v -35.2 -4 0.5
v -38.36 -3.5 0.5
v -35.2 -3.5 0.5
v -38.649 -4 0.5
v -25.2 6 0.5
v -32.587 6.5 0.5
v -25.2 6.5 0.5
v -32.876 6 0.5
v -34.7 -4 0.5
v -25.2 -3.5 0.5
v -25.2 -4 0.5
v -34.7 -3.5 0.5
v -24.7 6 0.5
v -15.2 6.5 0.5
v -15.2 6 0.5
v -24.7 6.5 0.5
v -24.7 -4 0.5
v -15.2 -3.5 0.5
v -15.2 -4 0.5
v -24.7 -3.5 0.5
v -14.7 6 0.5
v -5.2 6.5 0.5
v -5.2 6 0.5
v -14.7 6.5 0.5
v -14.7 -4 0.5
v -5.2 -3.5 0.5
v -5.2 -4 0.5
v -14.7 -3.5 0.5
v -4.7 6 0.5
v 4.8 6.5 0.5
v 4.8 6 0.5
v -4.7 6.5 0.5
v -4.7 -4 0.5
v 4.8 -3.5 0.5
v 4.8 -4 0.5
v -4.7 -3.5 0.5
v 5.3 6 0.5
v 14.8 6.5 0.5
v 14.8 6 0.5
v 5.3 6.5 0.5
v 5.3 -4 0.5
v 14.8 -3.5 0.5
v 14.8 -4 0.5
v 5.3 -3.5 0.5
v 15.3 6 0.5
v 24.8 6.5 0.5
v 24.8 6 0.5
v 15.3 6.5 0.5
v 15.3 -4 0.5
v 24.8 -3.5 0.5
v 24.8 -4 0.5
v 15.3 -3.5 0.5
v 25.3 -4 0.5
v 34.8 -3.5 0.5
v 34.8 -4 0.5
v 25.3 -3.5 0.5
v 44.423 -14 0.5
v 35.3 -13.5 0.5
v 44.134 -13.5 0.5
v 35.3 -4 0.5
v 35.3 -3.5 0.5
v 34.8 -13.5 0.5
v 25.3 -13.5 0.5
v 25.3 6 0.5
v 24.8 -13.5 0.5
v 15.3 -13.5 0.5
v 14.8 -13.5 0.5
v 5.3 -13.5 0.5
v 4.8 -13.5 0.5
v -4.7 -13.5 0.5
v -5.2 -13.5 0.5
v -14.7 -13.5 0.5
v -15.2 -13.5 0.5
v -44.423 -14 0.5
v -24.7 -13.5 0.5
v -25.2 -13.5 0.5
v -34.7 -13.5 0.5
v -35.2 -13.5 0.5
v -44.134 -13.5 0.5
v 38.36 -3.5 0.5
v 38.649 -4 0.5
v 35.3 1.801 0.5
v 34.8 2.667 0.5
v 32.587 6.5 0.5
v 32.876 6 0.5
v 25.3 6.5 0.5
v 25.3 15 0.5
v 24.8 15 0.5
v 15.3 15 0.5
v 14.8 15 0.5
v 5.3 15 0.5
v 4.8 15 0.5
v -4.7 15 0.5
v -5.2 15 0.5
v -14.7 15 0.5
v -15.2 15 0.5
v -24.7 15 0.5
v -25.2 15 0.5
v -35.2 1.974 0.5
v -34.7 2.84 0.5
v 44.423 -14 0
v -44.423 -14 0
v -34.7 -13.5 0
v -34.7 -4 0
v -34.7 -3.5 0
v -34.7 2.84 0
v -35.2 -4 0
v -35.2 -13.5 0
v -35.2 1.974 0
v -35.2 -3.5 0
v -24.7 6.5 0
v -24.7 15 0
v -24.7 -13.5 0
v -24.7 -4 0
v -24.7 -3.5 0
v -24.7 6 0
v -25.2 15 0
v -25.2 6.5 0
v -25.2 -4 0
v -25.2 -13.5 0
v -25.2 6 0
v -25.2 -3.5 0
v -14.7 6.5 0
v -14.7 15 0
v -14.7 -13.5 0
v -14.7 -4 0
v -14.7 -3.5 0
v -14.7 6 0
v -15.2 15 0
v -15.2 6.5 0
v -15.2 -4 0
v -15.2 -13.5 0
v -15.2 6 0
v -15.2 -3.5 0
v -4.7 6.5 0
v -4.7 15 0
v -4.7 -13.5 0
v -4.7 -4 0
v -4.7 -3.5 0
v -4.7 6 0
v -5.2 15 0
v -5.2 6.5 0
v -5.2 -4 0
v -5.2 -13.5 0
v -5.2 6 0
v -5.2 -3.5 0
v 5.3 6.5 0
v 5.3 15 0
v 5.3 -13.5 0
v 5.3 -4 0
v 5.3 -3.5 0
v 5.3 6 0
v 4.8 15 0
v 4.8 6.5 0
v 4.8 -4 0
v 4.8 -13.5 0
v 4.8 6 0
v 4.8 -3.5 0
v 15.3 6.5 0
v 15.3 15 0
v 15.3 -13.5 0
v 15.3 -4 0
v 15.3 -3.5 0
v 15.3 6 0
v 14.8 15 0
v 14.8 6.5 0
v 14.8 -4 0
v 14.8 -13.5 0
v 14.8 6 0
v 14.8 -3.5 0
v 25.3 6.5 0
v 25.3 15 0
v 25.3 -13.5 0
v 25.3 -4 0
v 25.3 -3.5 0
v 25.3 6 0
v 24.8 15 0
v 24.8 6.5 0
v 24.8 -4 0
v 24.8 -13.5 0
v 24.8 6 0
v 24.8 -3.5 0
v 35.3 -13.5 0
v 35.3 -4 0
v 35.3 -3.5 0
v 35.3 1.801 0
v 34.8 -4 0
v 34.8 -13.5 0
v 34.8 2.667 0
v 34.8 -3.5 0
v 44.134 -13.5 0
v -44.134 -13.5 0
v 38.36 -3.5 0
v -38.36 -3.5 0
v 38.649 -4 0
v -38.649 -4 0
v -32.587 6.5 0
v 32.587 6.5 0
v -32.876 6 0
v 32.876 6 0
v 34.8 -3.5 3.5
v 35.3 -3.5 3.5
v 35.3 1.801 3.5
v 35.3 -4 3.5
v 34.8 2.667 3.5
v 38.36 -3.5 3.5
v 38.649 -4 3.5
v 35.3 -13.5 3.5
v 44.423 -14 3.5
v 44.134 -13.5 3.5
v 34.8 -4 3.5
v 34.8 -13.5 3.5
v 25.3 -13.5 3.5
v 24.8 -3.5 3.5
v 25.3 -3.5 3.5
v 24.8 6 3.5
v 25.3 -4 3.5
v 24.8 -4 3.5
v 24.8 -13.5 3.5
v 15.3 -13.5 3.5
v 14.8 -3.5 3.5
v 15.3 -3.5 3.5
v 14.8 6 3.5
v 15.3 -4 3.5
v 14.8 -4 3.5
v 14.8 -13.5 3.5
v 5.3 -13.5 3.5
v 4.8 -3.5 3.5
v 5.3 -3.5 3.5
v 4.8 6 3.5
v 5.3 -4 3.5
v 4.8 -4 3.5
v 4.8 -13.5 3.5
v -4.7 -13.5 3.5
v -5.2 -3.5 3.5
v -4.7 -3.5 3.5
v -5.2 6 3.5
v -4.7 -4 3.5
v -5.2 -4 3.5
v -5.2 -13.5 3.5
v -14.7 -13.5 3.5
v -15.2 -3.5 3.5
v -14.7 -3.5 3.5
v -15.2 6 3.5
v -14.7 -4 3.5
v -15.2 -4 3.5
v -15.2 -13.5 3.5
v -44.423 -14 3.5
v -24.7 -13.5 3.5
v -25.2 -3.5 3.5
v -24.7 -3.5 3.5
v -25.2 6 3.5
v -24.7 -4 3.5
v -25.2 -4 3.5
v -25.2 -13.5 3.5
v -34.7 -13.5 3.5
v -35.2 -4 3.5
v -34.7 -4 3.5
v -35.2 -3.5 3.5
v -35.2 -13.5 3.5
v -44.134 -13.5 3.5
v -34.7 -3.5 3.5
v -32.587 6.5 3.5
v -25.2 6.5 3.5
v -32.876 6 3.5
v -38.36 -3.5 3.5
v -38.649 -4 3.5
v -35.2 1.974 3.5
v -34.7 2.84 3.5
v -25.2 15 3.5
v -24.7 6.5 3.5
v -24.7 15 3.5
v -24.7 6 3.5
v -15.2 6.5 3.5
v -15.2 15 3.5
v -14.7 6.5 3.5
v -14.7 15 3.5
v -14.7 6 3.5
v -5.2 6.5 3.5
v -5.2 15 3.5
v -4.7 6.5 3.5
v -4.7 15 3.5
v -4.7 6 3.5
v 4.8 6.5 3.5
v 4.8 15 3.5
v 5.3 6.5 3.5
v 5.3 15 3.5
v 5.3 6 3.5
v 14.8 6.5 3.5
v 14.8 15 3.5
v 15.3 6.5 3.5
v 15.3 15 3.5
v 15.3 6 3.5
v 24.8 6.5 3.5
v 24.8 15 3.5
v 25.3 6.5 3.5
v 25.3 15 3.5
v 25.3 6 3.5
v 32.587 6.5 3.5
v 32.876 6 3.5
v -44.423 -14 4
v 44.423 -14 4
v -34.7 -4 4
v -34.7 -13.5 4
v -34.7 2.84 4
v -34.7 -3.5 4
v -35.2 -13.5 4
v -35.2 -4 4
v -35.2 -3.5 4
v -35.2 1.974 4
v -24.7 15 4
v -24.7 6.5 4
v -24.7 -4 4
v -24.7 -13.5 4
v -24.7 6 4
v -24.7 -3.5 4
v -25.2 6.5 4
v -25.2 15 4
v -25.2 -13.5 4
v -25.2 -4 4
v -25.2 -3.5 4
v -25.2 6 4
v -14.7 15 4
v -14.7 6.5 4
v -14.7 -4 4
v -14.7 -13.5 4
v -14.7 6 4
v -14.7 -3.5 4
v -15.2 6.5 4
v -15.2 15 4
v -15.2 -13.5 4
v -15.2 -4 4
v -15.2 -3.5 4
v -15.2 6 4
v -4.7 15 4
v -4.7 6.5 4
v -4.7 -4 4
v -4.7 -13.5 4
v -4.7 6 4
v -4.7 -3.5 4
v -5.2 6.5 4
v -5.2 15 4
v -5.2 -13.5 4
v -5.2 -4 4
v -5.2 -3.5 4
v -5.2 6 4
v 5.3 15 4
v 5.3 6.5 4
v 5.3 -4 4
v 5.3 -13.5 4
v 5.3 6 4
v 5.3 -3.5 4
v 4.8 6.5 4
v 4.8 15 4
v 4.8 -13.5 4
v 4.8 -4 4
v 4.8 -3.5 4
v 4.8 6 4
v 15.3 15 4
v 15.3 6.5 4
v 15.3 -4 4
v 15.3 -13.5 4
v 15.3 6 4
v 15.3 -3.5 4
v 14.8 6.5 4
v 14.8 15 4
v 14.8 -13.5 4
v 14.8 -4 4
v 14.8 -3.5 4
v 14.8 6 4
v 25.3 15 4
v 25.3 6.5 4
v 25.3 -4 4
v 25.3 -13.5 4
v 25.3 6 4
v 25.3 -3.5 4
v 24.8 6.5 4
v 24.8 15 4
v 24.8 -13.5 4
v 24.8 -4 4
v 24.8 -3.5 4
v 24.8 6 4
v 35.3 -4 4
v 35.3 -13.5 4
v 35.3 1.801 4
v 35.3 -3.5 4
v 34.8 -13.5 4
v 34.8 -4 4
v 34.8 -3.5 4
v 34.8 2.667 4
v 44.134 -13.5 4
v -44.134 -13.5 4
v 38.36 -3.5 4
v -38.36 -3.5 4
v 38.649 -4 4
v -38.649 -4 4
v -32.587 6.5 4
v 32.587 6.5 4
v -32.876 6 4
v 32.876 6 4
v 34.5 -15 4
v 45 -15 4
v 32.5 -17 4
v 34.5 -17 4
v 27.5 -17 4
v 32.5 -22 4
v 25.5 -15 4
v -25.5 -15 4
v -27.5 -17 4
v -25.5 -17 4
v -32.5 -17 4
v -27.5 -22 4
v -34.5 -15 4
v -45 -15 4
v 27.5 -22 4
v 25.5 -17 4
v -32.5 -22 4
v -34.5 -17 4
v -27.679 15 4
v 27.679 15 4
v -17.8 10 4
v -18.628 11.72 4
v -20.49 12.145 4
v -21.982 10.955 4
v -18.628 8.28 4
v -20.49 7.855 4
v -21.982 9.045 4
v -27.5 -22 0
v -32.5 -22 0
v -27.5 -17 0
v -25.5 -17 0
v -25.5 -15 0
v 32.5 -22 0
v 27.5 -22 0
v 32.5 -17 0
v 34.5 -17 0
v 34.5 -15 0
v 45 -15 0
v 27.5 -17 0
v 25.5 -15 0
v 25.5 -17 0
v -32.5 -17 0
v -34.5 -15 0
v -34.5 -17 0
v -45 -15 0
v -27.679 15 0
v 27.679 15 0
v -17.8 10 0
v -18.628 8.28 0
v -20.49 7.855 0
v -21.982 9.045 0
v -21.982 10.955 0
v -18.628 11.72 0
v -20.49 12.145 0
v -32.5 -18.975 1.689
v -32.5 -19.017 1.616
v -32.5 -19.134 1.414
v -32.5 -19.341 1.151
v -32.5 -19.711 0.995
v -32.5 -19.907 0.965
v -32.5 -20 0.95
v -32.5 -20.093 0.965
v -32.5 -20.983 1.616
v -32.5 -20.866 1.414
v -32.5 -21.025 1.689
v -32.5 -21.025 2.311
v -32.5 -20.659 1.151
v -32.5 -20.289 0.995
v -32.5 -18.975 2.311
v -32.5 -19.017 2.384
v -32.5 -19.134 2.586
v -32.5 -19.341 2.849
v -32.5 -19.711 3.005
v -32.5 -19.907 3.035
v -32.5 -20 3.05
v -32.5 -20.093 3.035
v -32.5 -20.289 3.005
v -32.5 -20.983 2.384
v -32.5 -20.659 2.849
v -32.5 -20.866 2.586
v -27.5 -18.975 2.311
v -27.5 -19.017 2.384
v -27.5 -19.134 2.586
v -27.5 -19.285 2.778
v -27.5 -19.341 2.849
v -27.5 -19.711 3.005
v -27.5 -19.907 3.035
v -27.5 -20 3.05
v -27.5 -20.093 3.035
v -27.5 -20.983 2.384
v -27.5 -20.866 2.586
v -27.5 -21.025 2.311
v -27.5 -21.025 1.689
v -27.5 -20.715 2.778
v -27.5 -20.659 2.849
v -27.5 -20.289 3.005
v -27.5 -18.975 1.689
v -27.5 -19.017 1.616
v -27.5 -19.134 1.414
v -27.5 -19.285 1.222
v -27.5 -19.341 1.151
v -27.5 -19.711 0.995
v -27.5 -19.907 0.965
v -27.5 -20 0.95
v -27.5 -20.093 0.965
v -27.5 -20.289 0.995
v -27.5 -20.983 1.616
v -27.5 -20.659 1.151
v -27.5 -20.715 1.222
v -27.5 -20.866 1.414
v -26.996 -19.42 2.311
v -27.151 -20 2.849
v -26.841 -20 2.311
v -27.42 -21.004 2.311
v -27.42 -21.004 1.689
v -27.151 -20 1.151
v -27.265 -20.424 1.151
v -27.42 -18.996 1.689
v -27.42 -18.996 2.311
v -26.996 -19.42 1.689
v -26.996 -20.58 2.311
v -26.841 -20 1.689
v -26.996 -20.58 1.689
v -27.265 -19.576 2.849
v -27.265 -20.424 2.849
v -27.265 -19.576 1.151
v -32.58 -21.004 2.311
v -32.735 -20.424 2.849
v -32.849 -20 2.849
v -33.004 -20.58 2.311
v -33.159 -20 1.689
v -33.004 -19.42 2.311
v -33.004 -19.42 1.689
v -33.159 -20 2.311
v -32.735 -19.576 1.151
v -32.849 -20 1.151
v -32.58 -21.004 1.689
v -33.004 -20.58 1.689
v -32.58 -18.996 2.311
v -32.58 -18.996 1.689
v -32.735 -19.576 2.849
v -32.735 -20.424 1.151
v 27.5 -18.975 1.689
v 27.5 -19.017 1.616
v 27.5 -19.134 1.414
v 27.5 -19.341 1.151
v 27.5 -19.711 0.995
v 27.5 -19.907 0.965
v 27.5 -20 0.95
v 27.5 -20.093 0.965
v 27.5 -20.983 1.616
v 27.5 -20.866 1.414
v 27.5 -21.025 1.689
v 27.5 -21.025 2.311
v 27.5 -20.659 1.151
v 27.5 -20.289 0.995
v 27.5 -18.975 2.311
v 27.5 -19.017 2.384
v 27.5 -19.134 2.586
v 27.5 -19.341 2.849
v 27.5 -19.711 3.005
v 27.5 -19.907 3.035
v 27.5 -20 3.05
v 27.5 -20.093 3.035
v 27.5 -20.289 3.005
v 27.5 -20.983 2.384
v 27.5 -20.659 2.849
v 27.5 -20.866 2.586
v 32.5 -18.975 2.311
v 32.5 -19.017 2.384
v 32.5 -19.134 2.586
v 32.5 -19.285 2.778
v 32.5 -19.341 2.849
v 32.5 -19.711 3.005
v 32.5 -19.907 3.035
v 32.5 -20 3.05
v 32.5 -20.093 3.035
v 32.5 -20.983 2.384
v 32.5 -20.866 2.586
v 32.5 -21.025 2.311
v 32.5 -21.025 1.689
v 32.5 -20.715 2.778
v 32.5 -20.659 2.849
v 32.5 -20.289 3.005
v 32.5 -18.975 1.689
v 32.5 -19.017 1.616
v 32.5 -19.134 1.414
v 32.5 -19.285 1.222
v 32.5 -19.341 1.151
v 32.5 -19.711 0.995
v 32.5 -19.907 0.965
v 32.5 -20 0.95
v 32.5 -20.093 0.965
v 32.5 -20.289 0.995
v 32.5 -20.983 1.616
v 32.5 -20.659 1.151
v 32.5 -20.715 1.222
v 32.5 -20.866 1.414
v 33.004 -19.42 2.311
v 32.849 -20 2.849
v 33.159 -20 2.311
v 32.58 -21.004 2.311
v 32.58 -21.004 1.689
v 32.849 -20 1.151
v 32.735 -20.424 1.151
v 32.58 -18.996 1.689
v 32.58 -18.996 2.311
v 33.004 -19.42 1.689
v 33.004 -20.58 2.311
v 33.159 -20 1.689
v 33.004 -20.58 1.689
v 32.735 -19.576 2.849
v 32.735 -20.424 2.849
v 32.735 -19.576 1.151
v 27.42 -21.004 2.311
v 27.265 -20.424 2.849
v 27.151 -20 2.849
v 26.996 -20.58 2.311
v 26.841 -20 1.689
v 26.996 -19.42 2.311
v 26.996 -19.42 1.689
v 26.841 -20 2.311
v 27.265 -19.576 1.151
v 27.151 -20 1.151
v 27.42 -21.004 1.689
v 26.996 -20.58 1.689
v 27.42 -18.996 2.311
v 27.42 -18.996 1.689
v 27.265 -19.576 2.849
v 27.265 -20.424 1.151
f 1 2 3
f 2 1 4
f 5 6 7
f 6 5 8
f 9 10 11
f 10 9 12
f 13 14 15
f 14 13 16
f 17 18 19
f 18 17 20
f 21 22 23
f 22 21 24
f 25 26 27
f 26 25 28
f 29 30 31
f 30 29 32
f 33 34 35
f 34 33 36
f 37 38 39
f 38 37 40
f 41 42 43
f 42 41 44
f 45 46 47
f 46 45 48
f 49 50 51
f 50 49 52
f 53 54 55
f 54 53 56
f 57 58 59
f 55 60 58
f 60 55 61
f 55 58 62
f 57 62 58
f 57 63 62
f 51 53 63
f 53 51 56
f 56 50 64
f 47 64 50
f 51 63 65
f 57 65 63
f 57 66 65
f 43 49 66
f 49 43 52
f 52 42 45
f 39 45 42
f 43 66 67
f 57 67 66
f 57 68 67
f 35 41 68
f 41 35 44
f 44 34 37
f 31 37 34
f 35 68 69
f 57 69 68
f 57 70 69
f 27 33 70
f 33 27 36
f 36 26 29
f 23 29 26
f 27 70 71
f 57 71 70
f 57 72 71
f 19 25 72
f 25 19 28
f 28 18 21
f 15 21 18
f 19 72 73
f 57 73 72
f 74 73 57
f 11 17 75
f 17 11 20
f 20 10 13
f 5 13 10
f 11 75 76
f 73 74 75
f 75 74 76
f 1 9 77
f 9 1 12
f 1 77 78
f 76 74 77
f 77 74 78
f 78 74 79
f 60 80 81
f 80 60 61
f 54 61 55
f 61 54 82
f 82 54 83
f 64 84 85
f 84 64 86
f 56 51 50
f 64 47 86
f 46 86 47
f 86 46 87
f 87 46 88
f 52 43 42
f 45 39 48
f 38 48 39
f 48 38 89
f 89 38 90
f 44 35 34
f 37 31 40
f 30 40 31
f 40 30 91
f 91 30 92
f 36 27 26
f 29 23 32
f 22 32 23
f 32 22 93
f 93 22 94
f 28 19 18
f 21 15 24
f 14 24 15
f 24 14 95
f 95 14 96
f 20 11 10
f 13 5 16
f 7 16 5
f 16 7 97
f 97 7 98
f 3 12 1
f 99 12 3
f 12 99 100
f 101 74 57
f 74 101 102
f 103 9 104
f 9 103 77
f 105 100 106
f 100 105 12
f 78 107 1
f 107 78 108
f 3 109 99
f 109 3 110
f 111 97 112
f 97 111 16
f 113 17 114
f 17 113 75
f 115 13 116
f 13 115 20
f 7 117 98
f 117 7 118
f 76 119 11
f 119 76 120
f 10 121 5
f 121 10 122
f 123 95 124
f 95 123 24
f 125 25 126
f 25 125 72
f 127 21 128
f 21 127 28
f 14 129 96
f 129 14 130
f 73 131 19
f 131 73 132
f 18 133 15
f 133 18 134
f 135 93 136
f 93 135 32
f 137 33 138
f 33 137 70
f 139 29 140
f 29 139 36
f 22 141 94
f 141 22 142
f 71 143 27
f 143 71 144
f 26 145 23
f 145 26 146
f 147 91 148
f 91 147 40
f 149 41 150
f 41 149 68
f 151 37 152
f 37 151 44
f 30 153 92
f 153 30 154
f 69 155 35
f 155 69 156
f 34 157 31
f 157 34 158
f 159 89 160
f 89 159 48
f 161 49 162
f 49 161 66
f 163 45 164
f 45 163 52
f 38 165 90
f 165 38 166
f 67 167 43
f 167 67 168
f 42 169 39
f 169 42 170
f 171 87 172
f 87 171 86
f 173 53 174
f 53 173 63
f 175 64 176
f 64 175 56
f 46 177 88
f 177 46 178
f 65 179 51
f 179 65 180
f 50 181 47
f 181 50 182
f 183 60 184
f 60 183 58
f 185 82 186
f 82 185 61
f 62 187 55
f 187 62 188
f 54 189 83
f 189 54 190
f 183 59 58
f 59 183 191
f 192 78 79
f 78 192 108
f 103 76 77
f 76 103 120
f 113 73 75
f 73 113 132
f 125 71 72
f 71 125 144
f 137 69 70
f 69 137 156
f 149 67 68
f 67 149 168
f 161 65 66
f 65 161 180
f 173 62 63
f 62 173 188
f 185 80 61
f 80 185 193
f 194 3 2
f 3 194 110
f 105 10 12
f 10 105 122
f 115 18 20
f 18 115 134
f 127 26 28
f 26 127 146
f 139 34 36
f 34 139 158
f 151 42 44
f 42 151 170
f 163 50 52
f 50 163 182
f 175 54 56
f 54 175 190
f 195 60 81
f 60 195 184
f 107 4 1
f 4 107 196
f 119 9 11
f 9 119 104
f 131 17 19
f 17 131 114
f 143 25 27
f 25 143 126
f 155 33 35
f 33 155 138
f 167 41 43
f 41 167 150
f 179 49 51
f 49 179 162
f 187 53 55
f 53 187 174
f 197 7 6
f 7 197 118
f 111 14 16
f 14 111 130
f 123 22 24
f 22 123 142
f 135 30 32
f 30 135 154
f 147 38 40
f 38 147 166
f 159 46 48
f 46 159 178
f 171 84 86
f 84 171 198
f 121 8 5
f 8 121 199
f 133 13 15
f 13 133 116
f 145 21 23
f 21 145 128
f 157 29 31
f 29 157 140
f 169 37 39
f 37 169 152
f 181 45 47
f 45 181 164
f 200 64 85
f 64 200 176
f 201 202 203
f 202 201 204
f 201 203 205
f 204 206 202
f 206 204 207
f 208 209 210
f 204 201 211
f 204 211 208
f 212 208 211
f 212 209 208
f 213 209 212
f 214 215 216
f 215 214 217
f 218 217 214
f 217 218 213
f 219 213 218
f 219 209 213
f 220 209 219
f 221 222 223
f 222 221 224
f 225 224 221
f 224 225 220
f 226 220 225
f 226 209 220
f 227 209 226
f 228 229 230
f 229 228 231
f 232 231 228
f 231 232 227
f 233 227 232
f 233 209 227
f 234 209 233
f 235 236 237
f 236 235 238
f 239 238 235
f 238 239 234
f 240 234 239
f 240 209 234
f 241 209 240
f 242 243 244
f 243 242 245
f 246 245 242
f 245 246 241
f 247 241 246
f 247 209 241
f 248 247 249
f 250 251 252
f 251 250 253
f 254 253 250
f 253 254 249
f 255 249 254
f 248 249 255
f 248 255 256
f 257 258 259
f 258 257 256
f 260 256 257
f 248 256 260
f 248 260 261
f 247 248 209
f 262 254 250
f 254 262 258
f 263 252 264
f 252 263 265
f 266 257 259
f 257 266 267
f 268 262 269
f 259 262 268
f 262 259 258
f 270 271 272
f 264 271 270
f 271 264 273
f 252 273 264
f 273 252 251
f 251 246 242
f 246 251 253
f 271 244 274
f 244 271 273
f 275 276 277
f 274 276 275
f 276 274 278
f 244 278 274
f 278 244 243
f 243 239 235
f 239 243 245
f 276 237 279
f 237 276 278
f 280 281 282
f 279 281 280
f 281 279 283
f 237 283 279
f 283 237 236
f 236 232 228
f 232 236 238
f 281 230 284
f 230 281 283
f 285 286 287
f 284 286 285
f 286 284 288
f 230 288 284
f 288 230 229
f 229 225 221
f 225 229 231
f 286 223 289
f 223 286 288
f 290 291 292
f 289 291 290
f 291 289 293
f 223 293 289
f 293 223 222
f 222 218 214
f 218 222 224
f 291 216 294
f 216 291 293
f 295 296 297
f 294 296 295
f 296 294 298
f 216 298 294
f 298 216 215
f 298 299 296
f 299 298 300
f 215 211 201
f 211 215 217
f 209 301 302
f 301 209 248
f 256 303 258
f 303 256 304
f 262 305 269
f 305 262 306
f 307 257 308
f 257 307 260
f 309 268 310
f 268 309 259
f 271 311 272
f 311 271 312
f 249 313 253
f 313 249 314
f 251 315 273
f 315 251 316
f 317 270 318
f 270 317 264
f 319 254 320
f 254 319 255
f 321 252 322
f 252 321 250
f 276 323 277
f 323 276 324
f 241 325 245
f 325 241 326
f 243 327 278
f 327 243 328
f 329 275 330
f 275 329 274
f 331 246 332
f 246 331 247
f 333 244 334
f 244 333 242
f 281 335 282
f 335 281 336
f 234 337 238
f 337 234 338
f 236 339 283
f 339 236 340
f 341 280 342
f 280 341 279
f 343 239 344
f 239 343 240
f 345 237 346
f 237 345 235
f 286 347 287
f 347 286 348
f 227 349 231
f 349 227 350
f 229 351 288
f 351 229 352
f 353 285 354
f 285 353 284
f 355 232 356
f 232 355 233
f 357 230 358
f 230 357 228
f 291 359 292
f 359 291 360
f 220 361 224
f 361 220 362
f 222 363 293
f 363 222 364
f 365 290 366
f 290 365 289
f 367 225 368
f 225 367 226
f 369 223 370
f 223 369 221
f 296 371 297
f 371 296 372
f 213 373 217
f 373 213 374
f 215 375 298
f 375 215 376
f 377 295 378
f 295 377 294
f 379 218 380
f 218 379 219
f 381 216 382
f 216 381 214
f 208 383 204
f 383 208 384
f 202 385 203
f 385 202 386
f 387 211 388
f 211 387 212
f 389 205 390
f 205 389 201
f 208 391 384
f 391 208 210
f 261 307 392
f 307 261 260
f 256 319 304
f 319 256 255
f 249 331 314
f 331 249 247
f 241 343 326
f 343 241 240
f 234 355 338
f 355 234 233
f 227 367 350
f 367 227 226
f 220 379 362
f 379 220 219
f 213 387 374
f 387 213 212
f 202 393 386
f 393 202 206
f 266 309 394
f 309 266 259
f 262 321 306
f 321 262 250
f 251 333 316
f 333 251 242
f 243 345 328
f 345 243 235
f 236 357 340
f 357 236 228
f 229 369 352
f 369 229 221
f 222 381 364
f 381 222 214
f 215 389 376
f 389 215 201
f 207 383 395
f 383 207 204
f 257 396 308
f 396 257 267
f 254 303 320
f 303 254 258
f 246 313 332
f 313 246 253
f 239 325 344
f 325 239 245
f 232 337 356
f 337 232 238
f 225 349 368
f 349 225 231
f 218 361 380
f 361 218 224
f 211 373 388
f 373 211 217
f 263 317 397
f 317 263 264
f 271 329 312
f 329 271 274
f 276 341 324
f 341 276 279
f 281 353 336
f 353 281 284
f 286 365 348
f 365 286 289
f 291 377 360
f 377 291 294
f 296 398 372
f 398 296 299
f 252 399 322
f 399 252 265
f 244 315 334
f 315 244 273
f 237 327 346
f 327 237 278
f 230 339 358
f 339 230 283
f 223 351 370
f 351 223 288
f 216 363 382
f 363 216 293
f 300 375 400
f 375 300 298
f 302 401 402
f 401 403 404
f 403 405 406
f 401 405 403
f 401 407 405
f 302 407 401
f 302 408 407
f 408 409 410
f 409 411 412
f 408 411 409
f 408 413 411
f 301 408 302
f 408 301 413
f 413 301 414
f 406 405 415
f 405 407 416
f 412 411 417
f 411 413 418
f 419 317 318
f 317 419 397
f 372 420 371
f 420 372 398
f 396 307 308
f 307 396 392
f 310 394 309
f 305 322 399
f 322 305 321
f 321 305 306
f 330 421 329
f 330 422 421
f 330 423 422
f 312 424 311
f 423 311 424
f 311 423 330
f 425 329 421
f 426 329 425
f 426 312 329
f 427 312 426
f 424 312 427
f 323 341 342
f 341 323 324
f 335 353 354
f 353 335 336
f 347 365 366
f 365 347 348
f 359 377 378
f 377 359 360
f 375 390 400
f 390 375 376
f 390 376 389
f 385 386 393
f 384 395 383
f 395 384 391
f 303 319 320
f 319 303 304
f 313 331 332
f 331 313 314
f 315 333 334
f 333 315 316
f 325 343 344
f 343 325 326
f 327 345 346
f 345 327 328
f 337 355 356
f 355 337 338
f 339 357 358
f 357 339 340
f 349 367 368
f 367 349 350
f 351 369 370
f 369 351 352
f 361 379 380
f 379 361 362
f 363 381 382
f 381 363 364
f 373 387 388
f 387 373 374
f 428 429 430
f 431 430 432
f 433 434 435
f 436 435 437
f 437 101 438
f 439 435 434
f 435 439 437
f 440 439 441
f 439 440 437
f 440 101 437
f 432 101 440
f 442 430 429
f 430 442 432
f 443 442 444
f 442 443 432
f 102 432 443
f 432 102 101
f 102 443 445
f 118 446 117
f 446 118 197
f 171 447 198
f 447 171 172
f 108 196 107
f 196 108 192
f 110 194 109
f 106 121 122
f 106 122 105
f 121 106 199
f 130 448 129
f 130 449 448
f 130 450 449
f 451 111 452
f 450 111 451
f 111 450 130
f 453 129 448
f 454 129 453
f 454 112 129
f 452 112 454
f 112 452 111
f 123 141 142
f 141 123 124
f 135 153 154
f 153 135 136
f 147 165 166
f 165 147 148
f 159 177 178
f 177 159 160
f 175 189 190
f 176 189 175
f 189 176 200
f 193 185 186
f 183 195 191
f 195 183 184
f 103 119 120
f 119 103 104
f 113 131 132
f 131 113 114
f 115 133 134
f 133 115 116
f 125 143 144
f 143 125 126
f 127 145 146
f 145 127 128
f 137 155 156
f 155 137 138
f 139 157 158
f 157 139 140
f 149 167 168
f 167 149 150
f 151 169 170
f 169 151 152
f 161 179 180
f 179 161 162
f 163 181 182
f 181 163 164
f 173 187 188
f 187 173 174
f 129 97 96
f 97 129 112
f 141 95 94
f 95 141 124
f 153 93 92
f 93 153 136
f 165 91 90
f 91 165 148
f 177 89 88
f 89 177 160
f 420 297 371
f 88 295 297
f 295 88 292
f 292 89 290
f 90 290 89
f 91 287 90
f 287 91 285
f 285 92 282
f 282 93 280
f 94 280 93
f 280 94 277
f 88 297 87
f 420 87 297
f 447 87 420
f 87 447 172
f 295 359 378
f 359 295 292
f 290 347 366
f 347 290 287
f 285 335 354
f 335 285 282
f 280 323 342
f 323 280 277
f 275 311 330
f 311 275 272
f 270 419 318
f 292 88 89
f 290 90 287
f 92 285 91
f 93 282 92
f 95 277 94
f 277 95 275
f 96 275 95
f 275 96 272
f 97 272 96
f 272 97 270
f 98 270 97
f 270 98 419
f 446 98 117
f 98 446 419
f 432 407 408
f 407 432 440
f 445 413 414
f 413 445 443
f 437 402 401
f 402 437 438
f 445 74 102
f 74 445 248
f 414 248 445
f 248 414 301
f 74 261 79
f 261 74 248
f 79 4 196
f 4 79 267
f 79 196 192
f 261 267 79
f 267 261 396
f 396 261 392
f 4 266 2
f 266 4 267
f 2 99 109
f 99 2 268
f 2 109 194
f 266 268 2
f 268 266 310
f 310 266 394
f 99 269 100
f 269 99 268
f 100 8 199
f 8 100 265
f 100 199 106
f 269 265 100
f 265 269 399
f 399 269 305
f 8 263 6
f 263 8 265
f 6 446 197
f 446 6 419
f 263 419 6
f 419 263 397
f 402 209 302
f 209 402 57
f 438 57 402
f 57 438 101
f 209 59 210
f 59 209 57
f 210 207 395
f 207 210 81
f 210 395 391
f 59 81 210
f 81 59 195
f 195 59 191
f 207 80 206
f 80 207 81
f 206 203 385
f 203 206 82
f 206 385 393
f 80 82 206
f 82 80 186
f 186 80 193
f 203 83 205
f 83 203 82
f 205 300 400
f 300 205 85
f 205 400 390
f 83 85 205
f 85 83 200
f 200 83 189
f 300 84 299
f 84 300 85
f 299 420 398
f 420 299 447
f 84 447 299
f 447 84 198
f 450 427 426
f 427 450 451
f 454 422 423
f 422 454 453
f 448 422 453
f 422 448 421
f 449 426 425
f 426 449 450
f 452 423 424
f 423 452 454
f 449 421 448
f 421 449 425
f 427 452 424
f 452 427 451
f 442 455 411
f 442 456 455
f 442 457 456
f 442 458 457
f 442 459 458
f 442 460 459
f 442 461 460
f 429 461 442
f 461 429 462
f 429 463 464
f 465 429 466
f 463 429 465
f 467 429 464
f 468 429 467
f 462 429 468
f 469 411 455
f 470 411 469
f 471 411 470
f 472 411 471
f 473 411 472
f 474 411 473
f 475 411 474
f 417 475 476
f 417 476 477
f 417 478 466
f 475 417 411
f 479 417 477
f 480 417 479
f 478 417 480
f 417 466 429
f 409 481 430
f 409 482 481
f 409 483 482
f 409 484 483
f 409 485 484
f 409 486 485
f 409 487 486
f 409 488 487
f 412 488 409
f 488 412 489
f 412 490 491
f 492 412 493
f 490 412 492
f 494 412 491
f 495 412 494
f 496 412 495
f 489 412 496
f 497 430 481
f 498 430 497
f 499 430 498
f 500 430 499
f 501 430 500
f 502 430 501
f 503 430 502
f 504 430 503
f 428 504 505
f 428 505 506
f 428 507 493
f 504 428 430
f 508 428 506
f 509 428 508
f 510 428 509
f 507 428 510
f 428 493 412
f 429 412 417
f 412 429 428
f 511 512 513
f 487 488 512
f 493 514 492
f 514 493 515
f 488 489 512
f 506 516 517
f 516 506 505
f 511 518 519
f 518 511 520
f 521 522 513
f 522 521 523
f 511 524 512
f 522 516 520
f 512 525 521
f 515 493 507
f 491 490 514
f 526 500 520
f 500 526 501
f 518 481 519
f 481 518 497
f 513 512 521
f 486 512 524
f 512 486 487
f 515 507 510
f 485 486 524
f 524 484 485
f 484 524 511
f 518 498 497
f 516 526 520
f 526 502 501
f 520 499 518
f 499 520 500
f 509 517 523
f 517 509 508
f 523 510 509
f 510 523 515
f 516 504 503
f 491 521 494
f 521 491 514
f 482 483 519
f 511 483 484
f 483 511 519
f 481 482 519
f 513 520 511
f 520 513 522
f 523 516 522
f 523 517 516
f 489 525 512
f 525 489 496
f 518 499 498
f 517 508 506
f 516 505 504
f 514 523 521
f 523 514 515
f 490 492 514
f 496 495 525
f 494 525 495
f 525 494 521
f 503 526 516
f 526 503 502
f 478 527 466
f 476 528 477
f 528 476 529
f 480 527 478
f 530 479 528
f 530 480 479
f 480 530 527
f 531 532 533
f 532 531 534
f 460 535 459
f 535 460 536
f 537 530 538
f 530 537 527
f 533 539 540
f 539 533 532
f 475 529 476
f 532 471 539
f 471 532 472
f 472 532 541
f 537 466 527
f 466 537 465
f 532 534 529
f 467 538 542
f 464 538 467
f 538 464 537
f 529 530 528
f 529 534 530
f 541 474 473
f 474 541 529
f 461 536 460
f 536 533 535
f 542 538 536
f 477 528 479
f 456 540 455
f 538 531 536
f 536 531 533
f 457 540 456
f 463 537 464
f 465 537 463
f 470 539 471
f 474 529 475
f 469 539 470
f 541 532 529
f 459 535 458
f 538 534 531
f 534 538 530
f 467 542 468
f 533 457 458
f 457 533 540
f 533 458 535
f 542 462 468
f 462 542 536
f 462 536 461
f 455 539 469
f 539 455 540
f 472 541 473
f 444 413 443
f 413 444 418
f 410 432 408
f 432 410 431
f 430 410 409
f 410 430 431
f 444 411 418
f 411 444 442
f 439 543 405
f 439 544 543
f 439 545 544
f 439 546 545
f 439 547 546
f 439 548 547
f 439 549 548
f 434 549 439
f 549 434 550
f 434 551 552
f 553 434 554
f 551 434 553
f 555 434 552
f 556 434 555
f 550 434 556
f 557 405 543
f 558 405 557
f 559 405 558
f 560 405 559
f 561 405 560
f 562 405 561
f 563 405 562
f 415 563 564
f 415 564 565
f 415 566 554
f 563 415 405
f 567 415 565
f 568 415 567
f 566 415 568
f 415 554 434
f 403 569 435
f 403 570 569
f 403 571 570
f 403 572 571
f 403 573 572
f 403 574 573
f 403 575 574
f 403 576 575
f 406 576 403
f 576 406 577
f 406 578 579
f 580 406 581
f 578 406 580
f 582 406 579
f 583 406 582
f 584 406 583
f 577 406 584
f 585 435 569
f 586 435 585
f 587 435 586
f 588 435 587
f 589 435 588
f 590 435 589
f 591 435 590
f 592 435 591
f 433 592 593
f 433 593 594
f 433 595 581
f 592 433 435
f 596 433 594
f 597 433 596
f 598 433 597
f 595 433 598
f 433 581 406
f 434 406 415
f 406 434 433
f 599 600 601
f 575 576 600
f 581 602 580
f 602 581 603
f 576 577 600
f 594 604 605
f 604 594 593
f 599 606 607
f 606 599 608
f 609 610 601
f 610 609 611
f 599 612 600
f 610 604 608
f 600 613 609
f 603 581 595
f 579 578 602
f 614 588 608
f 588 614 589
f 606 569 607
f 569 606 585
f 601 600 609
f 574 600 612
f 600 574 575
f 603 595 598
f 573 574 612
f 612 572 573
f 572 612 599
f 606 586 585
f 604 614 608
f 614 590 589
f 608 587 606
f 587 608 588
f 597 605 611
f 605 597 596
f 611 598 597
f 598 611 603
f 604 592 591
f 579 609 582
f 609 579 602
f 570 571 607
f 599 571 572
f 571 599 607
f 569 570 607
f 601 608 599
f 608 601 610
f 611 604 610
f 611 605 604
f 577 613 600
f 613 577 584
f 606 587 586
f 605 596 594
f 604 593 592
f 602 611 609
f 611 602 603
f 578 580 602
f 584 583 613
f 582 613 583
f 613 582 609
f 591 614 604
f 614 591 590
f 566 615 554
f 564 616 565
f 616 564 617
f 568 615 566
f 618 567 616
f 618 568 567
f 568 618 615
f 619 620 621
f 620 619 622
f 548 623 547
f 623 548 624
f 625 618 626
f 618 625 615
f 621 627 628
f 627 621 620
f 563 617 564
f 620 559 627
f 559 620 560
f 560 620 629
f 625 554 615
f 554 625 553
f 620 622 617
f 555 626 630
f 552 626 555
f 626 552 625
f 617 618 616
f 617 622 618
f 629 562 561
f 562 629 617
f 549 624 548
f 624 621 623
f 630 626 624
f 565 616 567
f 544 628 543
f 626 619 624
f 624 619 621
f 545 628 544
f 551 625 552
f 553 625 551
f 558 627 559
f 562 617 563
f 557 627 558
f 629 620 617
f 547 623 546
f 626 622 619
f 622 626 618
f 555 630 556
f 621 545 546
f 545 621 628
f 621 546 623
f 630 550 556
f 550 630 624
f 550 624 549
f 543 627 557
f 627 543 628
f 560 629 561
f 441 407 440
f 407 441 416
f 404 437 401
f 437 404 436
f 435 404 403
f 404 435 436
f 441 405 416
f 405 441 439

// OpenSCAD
/*
  Mars Rover
  by Tony Buser <tbuser@gmail.com>
  http://creativecommons.org/licenses/by-nc-sa/3.0/

  Dimple Tabs on the solar panels by gpvillamil http://www.thingiverse.com/thing:10095

  For bonus points, print body in yellow, panels in black, wheels in black, everything else in white

  20 models
  42 total parts

  BOM:
    1 body
    1 panel_center
    1 panel_back
    2 panel_side_back
    2 panel_side_front
    6 wheel
    2 axel_front
    2 axel_back
    12 bolt
    2 arm
    1 arm_sensor
    1 target
    1 antenna_uhf
    1 antenna_low
    1 antenna_high_bottom
    1 antenna_high_top
    1 camera_bottom
    1 camera_top
    2 camera_top_side
    1 camera
*/

// how much to increase holes where bolts need to snap into
tolerance = 0.2;

// which part to make
// use "tolerance_test" to help find your tolerance setting to use
// it will print a bar with holes that increase tolerance from 0.0 to 0.5 in 0.1 increments
// the one you want to use is the one where the bolt snaps in tightly and doesn't fall out
part = "panel_back";

bolt_hole_radius = 2+(2*(tolerance/2));

// layout();
// layout_panels();
// print_part("panel_center");

// body();
// panel_center();
// panel_back();
// panel_side_back();
// panel_side_front();
// wheel();
// axel_front();
// axel_back();
// bolt();
// arm();
// arm_sensor();
// target();
// antenna_uhf();
// antenna_low();
// antenna_high_bottom();
// antenna_high_top();
// camera_bottom();
// camera_top();
// camera_top_side();
// camera();

// stupid openscad recursion limitations...
if (part == "plate1") {
  // 1.5 hours
  print_plate("1");
} else if (part == "plate2") {
  // 1.5 hours
  print_plate("2");
} else if (part == "plate3") {
  // 1.25 hours
  print_plate("3");
} else if (part == "plate4") {
  // 1.25 hours
  print_plate("4");
} else if (part == "plate5") {
  // 2.25 hours
  print_plate("5");
} else if (part == "layout_panels") {
  layout_panels();
} else if (part == "layout") {
  layout();
} else {
  print_part(part);
}

module print_plate(number) {
  print_guide();
  
  if (number == "1") {
    print_part("body");
  } else if (number == "2") {
    translate([0, 20, 0]) print_part("panel_center");
    translate([-30, -16, 0]) print_part("wheel");
    translate([-18, -37, 0]) print_part("wheel");
    translate([30, -16, 0]) print_part("wheel");
    translate([18, -37, 0]) print_part("wheel");
  } else if (number == "3") {
    translate([0, -34, 4]) rotate([0, 180, -90]) print_part("panel_side_back");
    translate([0, -3, 4]) rotate([0, 180, -90]) print_part("panel_side_front");
    translate([0, 35, 4]) rotate([0, 180, 0]) print_part("panel_back");
  } else if (number == "4") {
    translate([-15, 32, 0]) print_part("wheel");
    translate([15, 32, 0]) print_part("wheel");
    translate([0, -34, 0]) rotate([0, 0, -90]) print_part("panel_side_back");
    translate([0, -3, 0]) rotate([0, 0, 90]) print_part("panel_side_front");
  } else if (number == "5") {
    translate([-11, -42, 0]) print_part("bolt");
    translate([-11, -29, 0]) print_part("bolt");
    translate([-11, -16, 0]) print_part("bolt");
    translate([-11, -3, 0]) print_part("bolt");
    translate([-11, 10, 0]) print_part("bolt");
    translate([-11, 23, 0]) print_part("bolt");

    translate([7, -42, 0]) print_part("bolt");
    translate([7, -29, 0]) print_part("bolt");
    translate([7, -16, 0]) print_part("bolt");
    translate([7, -3, 0]) print_part("bolt");
    translate([7, 10, 0]) print_part("bolt");
    translate([7, 23, 0]) print_part("bolt");

    translate([44, 12, 0]) print_part("axel_front");
    translate([31, -13, 0]) rotate([0, 0, 190]) print_part("axel_back");

    translate([-44, -10, 0]) rotate([0, 0, 180]) print_part("axel_front");
    translate([-29, 19, 0]) rotate([0, 0, 10]) print_part("axel_back");

    translate([-33, -22, 0]) print_part("antenna_high_bottom");
    translate([27.5, 25, 0]) rotate([0, 0, 180+53]) print_part("antenna_high_top");

    translate([-4, 40, 0]) print_part("camera");

    translate([-2, 33, 0]) print_part("camera_bottom");

    translate([-2, 17, 0]) print_part("antenna_uhf");

    translate([-2, 3, 0]) print_part("camera_top");

    translate([-2, -10, 0]) print_part("antenna_low");

    translate([-22, -8, 0]) print_part("target");

    translate([-2, -22, 0]) print_part("camera_top_side");

    translate([-2, -35, 0]) print_part("camera_top_side");

    translate([17, -19, 0]) rotate([0, 0, 180]) print_part("arm");
    translate([30, -45, 0]) rotate([0, 0, -90]) print_part("arm");
    
    translate([-21.5, -20, 0]) rotate([0, 0, 180]) print_part("arm_sensor");
  } else {
    echo("I'm sorry Dave, I'm afraid I can't do that");
  }
}

module print_part(part) {
  echo("printing part: ", part);
  
  if (part == "body") {
    translate([38/2, -63/2, 25]) rotate([0, 180, 0]) body();
  } else if (part == "panel_center") {
    translate([38/2, -95/2, 4]) rotate([0, 180, 0]) panel_center();
  } else if (part == "panel_back") {
    translate([-90/2, -30/2, 0]) panel_back();
  } else if (part == "panel_side_back") {
    translate([-30/2, -70/2, 0]) panel_side_back();
  } else if (part == "panel_side_front") {
    translate([-30/2, -70/2, 0]) panel_side_front();
  } else if (part == "wheel") {
    wheel();
  } else if (part == "axel_front") {
    translate([0, -32.5, 0]) axel_front();
  } else if (part == "axel_back") {  
    translate([0, -40/2, 0]) axel_back();
  } else if (part == "bolt") {
    bolt();
  } else if (part == "arm") {
    translate([-5/2, -30/2, 0]) arm();
  } else if (part == "arm_sensor") {
    translate([-5/2, -10/2, 0]) arm_sensor();
  } else if (part == "target") {
    target();
  } else if (part == "antenna_uhf") {  
    antenna_uhf();
  } else if (part == "antenna_low") {
    antenna_low();
  } else if (part == "antenna_high_bottom") {  
    translate([-5, 10, 0]) rotate([90, 0, 0]) antenna_high_bottom();
  } else if (part == "antenna_high_top") {
    antenna_high_top();
  } else if (part == "camera_bottom") {
    camera_bottom();
  } else if (part == "camera_top") {
    camera_top();
  } else if (part == "camera_top_side") {  
    camera_top_side();
  } else if (part == "camera") {
    translate([-41/2, 0, 0]) camera();
  } else if (part == "tolerance_test") {
    tolerance_test();
  // openscad doesn't allow recursion :(
  // } else if (part == "layout") {
  //   layout();
  // } else if (part == "plate1") {
  //   print_plate("1");
  // } else if (part == "plate2") {
  //   print_plate("2");
  // } else if (part == "plate3") {
  //   print_plate("3");
  // } else if (part == "plate4") {
  //   print_plate("4");
  // } else if (part == "plate5") {
  //   print_plate("5");
  } else {
    echo("I'm sorry Dave, I'm afraid I can't do that.");
  }
}

module layout() {
  union() {
    translate([-38/2, -63/2, 25]) body();
  
    translate([0, 0, 25+25]) {
      layout_panels();
    }
  
    translate([+15/2-30-2, 0, 15/2]) rotate([0, -90, 0]) {
      translate([0, -45, 0]) wheel();
      translate([0, 5, 4]) wheel();
      translate([0, 45, 4]) wheel();
    }

    // translate([-15/2+30+2, 0, 15/2]) rotate([0, 90, 0]) {
    //   translate([0, -45, 0]) wheel();
    //   translate([0, 5, 4]) wheel();
    //   translate([0, 45, 4]) wheel();
    // }
    //   
    translate([-38/2-1, -44, 8]) rotate([0, -90, 0]) rotate([0, 0, -30]) axel_front();
    // translate([+38/2+1+3, -44, 8]) rotate([0, -90, 0]) rotate([0, 0, -30]) axel_front();
  
    translate([-38/2-1-4, 3, 18]) rotate([0, -90, 0]) axel_back();
    // translate([+38/2+1+4+3, 3, 18]) rotate([0, -90, 0]) axel_back();

    translate([8, -22, 38-2]) rotate([0, 90, 180]) rotate([0, 0, 10]) arm();
    translate([0, -50, 43-1]) rotate([0, 90, 180]) rotate([0, 180, -135]) arm();
    translate([-6, -28, 17-1]) rotate([0, -90, 180]) arm_sensor();

    translate([-20, 69.5, 50-3]) target();
  
    translate([-35, 58/2-2.5, 50-3]) antenna_uhf();
    translate([15, 21, 99]) rotate([0, 180, 0]) antenna_low();
  
    translate([34.5, 23.5, 54]) rotate([0, 0, 90]) antenna_high_bottom();
    translate([51, 28.5, 70]) rotate([0, 0, 180]) antenna_high_top();
  
    translate([0, -24.5, 74]) rotate([0, 180, 0]) camera_bottom();
    translate([0, -24.5, 74-4]) rotate([0, 0, 0]) camera_top();
    translate([0, -24.5, 74+30]) rotate([0, 90, 0]) camera_top_side();
    translate([0, -24.5, 74+30]) rotate([0, -90, 0]) camera_top_side();
    translate([-41/2, -24.5+5, 74+38]) rotate([90, 0, 0]) camera();
  
    // print_guide();
  }
}

module layout_panels() {
  translate([-38/2, -63/2, 0]) panel_center();
  color([200/255, 200/255, 20/255]) translate([-90/2, -30/2+7+77/4+33, 0]) panel_back();
  rotate([0, 0, 30]) translate([-95/2+8.25, 70/2+2, 0]) {
    translate([-30/2, 1, 0]) panel_side_back();
    color([200/255, 200/255, 20/255]) translate([-30/2, -70-1, 0]) panel_side_front();
  }

  rotate([0, 180, 0]) translate([0, 0, -4]) rotate([0, 0, 30]) translate([-95/2+8.25, 70/2+2, 0]) {
    translate([-30/2, 1, 0]) panel_side_back();
    color([200/255, 200/255, 20/255]) translate([-30/2, -70-1, 0]) panel_side_front();
  }
}

module print_guide() {
  %difference() {
    cube([100, 100, 1], center=true);
    cube([100-1, 100-1, 2], center=true);
  }
}

module body() {
  difference() {
    body_and_panel();
    translate([-100, -100, 25]) cube([200, 200, 200]);
  }
}

module panel_center() {
  translate([0, 0, -25]) {
    union() {
      difference() {
        body_and_panel();
        translate([-100, -100, 0]) cube([200, 200, 25]);

        // openscad limit :(
        translate([-31, -24, 25+4-0.5]) solar_panel_lines();
        // union() {
        //   for (i = [0:10]) {
        //     translate([i*10, 0, 0]) cube([2, 100, 1]);
        //   }
        //   for (i = [0:10]) {
        //     translate([0, i*10, 0]) cube([100, 2, 1]);
        //   }
        // }
        
        // makerbot logo
        translate([19, 32, 27]) rotate([0, 0, -90]) scale(0.9) import_stl("makerbot_logo.stl", convexity=30);
      
        // tab slots
        translate([(38/2)-30, 77-3, 25]) {
          translate([-2.5, -5, -1]) slot_female();
        }
        translate([(38/2)+30, 77-3, 25]) {
          translate([-2.5, -5, -1]) slot_female();
        }
      
        // // tab slots
        // translate([(38/2)-30, 77-3, 25]) {
        //   translate([-2.5, -5, -1]) cube([5, 6, 6]);
        // }
        // translate([(38/2)+30, 77-3, 25]) {
        //   translate([-2.5, -5, -1]) cube([5, 6, 6]);
        // }

        translate([38/2, 63/2, 25]) {
          rotate([0, 0, 30]) translate([-95/2+8.25+1, 70/2+2+2.5, 0]) {
            color([200/255, 200/255, 20/255]) translate([-30/2, -70-1, 0]) {
              rotate([0, 0, -90]) translate([-70/2-15, 30, -1]) slot_female();
              rotate([0, 0, -90]) translate([-70/2+15, 30, -1]) slot_female();
            }
          }

          rotate([0, 180, 0]) translate([0, 0, -4]) rotate([0, 0, 30]) translate([-95/2+8.25+1, 70/2+2+2.5, 0]) {
            color([200/255, 200/255, 20/255]) translate([-30/2, -70-1, 0]) {
              rotate([0, 0, -90]) translate([-70/2-15, 30, -1]) slot_female();
              rotate([0, 0, -90]) translate([-70/2+15, 30, -1]) slot_female();
            }
          }
          
          // ugly! but I'm in a hurry, copy paste copy paste
          // rotate([0, 0, 30]) translate([-95/2+8.25, 70/2+2, 0]) {
          //   color([200/255, 200/255, 20/255]) translate([-30/2, -70-1, 0]) {
          //     rotate([0, 0, -90]) translate([-70/2-15, 30, -1]) {
          //       translate([-2.5, 0, 0]) cube([5, 7, 6]);
          //       translate([-4.5, 0, 0]) cube([9, 2, 6]);
          //     }    
          //     rotate([0, 0, -90]) translate([-70/2+15, 30, -1]) {
          //       translate([-2.5, 0, 0]) cube([5, 7, 6]);
          //       translate([-4.5, 0, 0]) cube([9, 2, 6]);
          //     }            
          //   }
          // }
          // 
          // rotate([0, 180, 0]) translate([0, 0, -4]) rotate([0, 0, 30]) translate([-95/2+8.25, 70/2+2, 0]) {
          //   color([200/255, 200/255, 20/255]) translate([-30/2, -70-1, 0]) {
          //     rotate([0, 0, -90]) translate([-70/2-15, 30, -1]) {
          //       translate([-2.5, 0, 0]) cube([5, 7, 6]);
          //       translate([-4.5, 0, 0]) cube([9, 2, 6]);
          //     }    
          //     rotate([0, 0, -90]) translate([-70/2+15, 30, -1]) {
          //       translate([-2.5, 0, 0]) cube([5, 7, 6]);
          //       translate([-4.5, 0, 0]) cube([9, 2, 6]);
          //     }            
          //   }
          // }        
        }
              
      }
      // fill hole for 3rd mounting tab
      translate([38/2, 0, 21]) {
        translate([-15, 52, 0]) cylinder(h=8, r=bolt_hole_radius);
      }
    }
  }
}

module panel_back() {
  union() {
    difference() {
      cube([90, 30, 4]);
      rotate([0, 0, -30]) translate([-50, 0, -1]) cube([50, 50, 6]);
      translate([90, 0, -1]) rotate([0, 0, 30]) cube([50, 50, 6]);
      // target hole
      translate([25, 25, -1]) cylinder(h=6, r=bolt_hole_radius);
      
      translate([-10.2, 1, -0.5]) solar_panel_lines();
      translate([-10.2, 1, 4-0.5]) solar_panel_lines();
    }
    
    // tabs
    translate([(90/2)-30, 0, 0]) rotate([0, 0, 180]) tab_male();
    translate([(90/2)+30, 0, 0]) rotate([0, 0, 180]) tab_male();
    
    // // tabs
    // translate([(90/2)-30, 0, 0]) {
    //   translate([-2.5, -7, 0]) cube([5, 7, 4]);
    //   translate([-4.5, -2, 0]) cube([9, 2, 4]);
    // }
    // translate([(90/2)+30, 0, 0]) {
    //   translate([-2.5, -7, 0]) cube([5, 7, 4]);
    //   translate([-4.5, -2, 0]) cube([9, 2, 4]);
    // }
  }
}

module panel_side_back() {
  difference() {
    cube([30, 70, 4]);
    translate([30, 70, -1]) rotate([0, 0, 90+30]) cube([60, 60, 6]);

    translate([-5.0, -1, -0.5]) solar_panel_lines();
    translate([-5.0, -1, 4-0.5]) solar_panel_lines();

    // tab slots
    translate([-2.5, -1, -1]) {
      translate([30/2-7.5, 0, 0]) slot_female();
      translate([30/2+7.5, 0, 0]) slot_female();
    }
    
    // // tab slots
    // translate([-2.5, -1, -1]) {
    //   translate([30/2-7.5, 0, 0]) cube([5, 6, 6]);
    //   translate([30/2+7.5, 0, 0]) cube([5, 6, 6]);
    // }
  }
}

module panel_side_front() {
  union() {
    difference() {
      cube([30, 70, 4]);
      translate([30, 0, -1]) rotate([0, 0, -180-30]) cube([60, 30, 6]);
      
      translate([-5, -1, -0.5]) solar_panel_lines();
      translate([-5, -1, 4-0.5]) solar_panel_lines();      
    }
   
    // back tabs
    translate([(30/2)-7.5, 70, 0]) tab_male();
    translate([(30/2)+7.5, 70, 0]) tab_male();
    
    // side tabs
    rotate([0, 0, -90]) translate([-70/2-15, 30, 0]) tab_male();
    rotate([0, 0, -90]) translate([-70/2+15, 30, 0]) tab_male();
   
    // // back tabs
    // translate([(30/2)-7.5, 70, 0]) {
    //   translate([-2.5, 0, 0]) cube([5, 7, 4]);
    //   translate([-4.5, 0, 0]) cube([9, 2, 4]);
    // }    
    // translate([(30/2)+7.5, 70, 0]) {
    //   translate([-2.5, 0, 0]) cube([5, 7, 4]);
    //   translate([-4.5, 0, 0]) cube([9, 2, 4]);
    // }    
    // 
    // // side tabs
    // rotate([0, 0, -90]) translate([-70/2-15, 30, 0]) {
    //   translate([-2.5, 0, 0]) cube([5, 7, 4]);
    //   translate([-4.5, 0, 0]) cube([9, 2, 4]);
    // }    
    // rotate([0, 0, -90]) translate([-70/2+15, 30, 0]) {
    //   translate([-2.5, 0, 0]) cube([5, 7, 4]);
    //   translate([-4.5, 0, 0]) cube([9, 2, 4]);
    // }    
  }
}

module body_and_panel() {
  union() {
    difference() {
      union() {
        cube([38, 63, 25+4]);
        translate([-95/2+38/2, -3, 25]) {
          difference() {
            cube([95, 77, 4]);
            translate([0, 77-5, -1]) rotate([0, 0, 65]) cube([10, 10, 10]);
            translate([91.5, 80, -1]) rotate([0, 0, -65]) cube([10, 10, 10]);
          }
        }
        
        // openscad limit :(
        // translate([-5, -1, 25+4-0.5]) solar_panel_lines();        
      }

      // front cutout
      translate([-1, -1, -1]) cube([38+2, 20+1, 15+1]);
      translate([38, 20, 0]) rotate([0, 0, -90-30]) translate([-70, 0, 0]) cube([100, 100, 25+4+1]);
      translate([0, 20, 25+4+1]) rotate([0, 180, 90+30]) translate([-70, 0, 0]) cube([100, 100, 25+4+1]);

      // side tapers
      rotate([0, -6, 0]) translate([-38+1.6, 0, -3]) cube([38, 63+2, 15+5]);
      rotate([0, 6, 0]) translate([+38-1.8, 0, +3]) cube([38, 63+2, 15+5]);
  
      // wheel holes
      translate([-1, 25, 5]) rotate([0, 90, 0]) cylinder(h=40, r=2);
      
      // top holes
      translate([38/2, 0, 20]) {
        // cam
        translate([0, 7, 0]) cylinder(h=10, r=bolt_hole_radius);
        // antenna low
        translate([15, 52, 0]) cylinder(h=9, r=bolt_hole_radius);
        // mount tab
        translate([-15, 52, 0]) cylinder(h=9, r=bolt_hole_radius);
        // antenna high
        translate([30, 60, 0]) cylinder(h=9, r=bolt_hole_radius);
        // antenna uhf
        translate([-35, 58, 0]) cylinder(h=9, r=bolt_hole_radius);
      }
    }
  
    // front arm mount
    difference() {
      translate([38/2, 7, 15-10]) cylinder(h=11, r=4);
      translate([38/2-7, 7, 15-10+4]) rotate([0, 90, 0]) cylinder(h=14, r=bolt_hole_radius);
    }
  
    // front sensors
    translate([38/2, 1, 25-5]) body_sensors();

    // back sensors
    translate([38/2, 63+1, 25-5]) body_sensors();
  }
}

module body_sensors() {
  rotate([90, 0, 0]) {
    translate([-3, 0, 0]) {
      translate([-2, -2, 0]) cube([4, 4, 2]);
      translate([0, 0, -1]) cylinder(h=4, r=1);
    }
    translate([3, 0, 0]) {
      translate([-2, -2, 0]) cube([4, 4, 2]);
      translate([0, 0, -1]) cylinder(h=4, r=1);
    }
  }
}

module wheel() {
  difference() {
    union() {
      translate([0, 0, 10]) cylinder(h=5, r1=20/2, r2=17/2);
      translate([0, 0, 5]) cylinder(h=5, r=20/2);
      translate([0, 0, 0]) cylinder(h=5, r1=17/2, r2=20/2);
    }
    
    translate([0, 0, 15/2]) cylinder(h=15, r=13/2);    
    translate([0, 0, -1]) cylinder(h=15+2, r=bolt_hole_radius);
    
    // translate([0, 0, -1]) cylinder(h=5, r=10/2);
  }
}

module axel_front() {
  difference() {
    union() {
      cube([5, 65, 3]);
      translate([0, 65, 0]) rotate([0, 0, 45+45]) {
        cube([5, 20, 3]);
        // back hole
        translate([0, 20, 0]) cylinder(h=3, r=6);
      }
      
      translate([0, 65, 0]) cylinder(h=3, r=6);

      // middle hole    
      translate([0, 65/3*2, 0]) cylinder(h=3, r=6);
        
      // front hole
      translate([0, 0, 0]) cylinder(h=3, r=6);
    }
    
    // back hole
    translate([0, 65, 0]) rotate([0, 0, 45+45]) translate([0, 20, -1]) cylinder(h=7, r=bolt_hole_radius);
    
    // middle hole
    translate([0, 65/3*2, -1]) cylinder(h=7, r=3);

    // front hole
    translate([0, 0, -1]) cylinder(h=7, r=3);
  }
}

module axel_back() {
  difference() {
    union() {
      cube([5, 45, 3]);

      // middle hole
      translate([5, 45/2-3, 0]) cylinder(h=3, r=6);

      translate([-10, 0, 0]) {
        cube([10, 5, 3]);
        // front hole
        translate([0, 2.5, 0]) cylinder(h=3, r=6);

        translate([0, 45-5, 0]) cube([10, 5, 3]);
        // back hole
        translate([0, 45-2.5, 0]) cylinder(h=3, r=6);
      }
    }
    
    // middle hole
    translate([5, 45/2-3, -1]) cylinder(h=7, r=3);
    
    // front hole
    translate([-10, 2.5, -1]) cylinder(h=7, r=3);

    // back hole
    translate([-10, 45-2.5, -1]) cylinder(h=7, r=3);
  }
}

module bolt() {
  union() {
    cylinder(h=3, r=6);
    cylinder(h=11, r=2);
  }
}

module arm() {
  difference() {
    union() {
      cube([5, 30, 3]);
      translate([2.5, 0, 0]) {
        // front shaft
        translate([0, 2, 0]) {
          cylinder(h=10, r=2);
          cylinder(h=3, r=4);
        }

        // back hole
        translate([0, 30, 0]) {
          cylinder(h=3, r=5);
        }
      }
    }
    
    // back hole
    translate([2.5, 30, -1]) cylinder(h=10, r=bolt_hole_radius);
  }
}

module arm_sensor() {
  union() {
    cube([6, 10, 5]);
    translate([6/2, 2, 0]) cylinder(h=10, r=2);
    translate([6/2-1, 0, 0]) cube([2, 15, 5]);
  }
}

module target() {
  union() {
    cylinder(h=4+4+3, r=2);
    cylinder(h=3, r=4);
  }
}

module antenna_uhf() {
  union() {
    cylinder(h=8+15+3, r=2);
    cylinder(h=3, r=4);
  }
}

module antenna_low() {
  union() {
    cylinder(h=45+8, r=2);
    cylinder(h=3, r=4);
    translate([0, 0, 15]) cylinder(h=2.5, r1=3, r2=2);
    translate([0, 0, 15-2.5]) cylinder(h=2.5, r1=2, r2=3);
    translate([0, 0, 25]) cylinder(h=5, r=3);
    translate([0, 0, 30]) cylinder(h=15, r1=2, r2=5);
  }
}

module antenna_high_bottom() {
  difference() {
    union() {
      // base
      cube([10, 10, 2]);
      translate([5, 5, 0]) cylinder(h=7, r=3);
      translate([5-1.5, 0, 0]) cube([3, 5, 7]);
      //translate([5, 5, 0]) cylinder(h=4, r=3);

      // top
      difference() {
        translate([1, 0, 7]) cube([8, 8, 10]);
        // cutout
        translate([0, 10, 8]) rotate([45, 0, 0]) cube([10, 8, 20]);        
        translate([0, 0, 15]) cube([10, 8, 20]);        
      }
 
      //translate([2, 2, 6]) cube([6, 6, 1]);
 
      translate([5, 3, 19]) rotate([90, 0, 0]) cylinder(h=3, r=6);
    }
    
    // side hole
    translate([5, 5, 19]) rotate([90, 0, 0]) cylinder(h=10, r=3);
    
    // bottom bolt hole
    translate([5, 5, -1]) cylinder(h=5, r=bolt_hole_radius);
  }
}

module antenna_high_top() {
  difference() {
    union() {
      difference() {
        cylinder(h=6, r=10);
        translate([20-10/8, 0, 4]) cube([20, 20, 10], center=true);
      }
      translate([8, 0, 3]) cube([16, 6, 6], center=true);
    }
    
    translate([16-4, 0, 3]) rotate([0, 90, 0]) cylinder(h=5, r=bolt_hole_radius);
  }
}

module camera_bottom() {
  difference() {
    union() {
      // central tube/mounting tab
      cylinder(h=20+8, r=2);
    
      // middle bar
      cylinder(h=8, r=6.7);
    
      // main tube
      cylinder(h=20, r=4.5);
    
      // sensor
      translate([-2, -5, 13]) cube([4, 2, 6]);
      translate([0, 0, 14.5]) rotate([90, 0, 0]) cylinder(h=6, r=1);
      translate([0, 0, 17.5]) rotate([90, 0, 0]) cylinder(h=6, r=1);
    }
    
    // top main tube slot
    translate([0, 0, -1]) cylinder(h=8, r=4.7);
  }
}

module camera_top() {
  difference() {
    union() {
      cylinder(h=34, r=4.5);
      translate([-9/2, 0, 34]) rotate([0, 90, 0]) cylinder(h=9, r=6.5);
    }

    // tube slot
    translate([-9/2-1, 0, 34]) rotate([0, 90, 0]) cylinder(h=11, r=4.6);

    translate([-1, 0, 34]) rotate([0, 90, 0]) cylinder(h=2, r=4.8);
    
    translate([0, 0, 40]) cube([15, 1.5, 10], center=true);
  }
}

module camera_top_side() {
  union() {
    cylinder(h=20, r=2);
    cylinder(h=15, r=4.5);
    // translate([0, 0, 7]) cylinder(h=5, r1=4.5, r2=3.5);
    // translate([0, 0, 12]) cylinder(h=2, r1=3.5, r2=4);
    // translate([0, 0, 14]) cylinder(h=2, r=4);
  }
}

module camera() {
  difference() {
    union() {
      difference() {
        cube([41, 10, 10]);
        // cutout
        translate([4, 2, 2]) cube([41-8, 10-2+1, 10-2+1]);
      }
      
      // cameras
      translate([10, 6, 0]) {
        cylinder(h=12, r=4);
        cylinder(h=14, r=2);
      }

      translate([41-10, 6, 0]) {
        cylinder(h=12, r=4);
        cylinder(h=14, r=2);
      }
      
      // tabs
      translate([0, -13, 0]) cube([4, 13, 10]);
      translate([41-4, -13, 0]) cube([4, 13, 10]);
    }
    
    // holes
    translate([-1, -8, 5]) rotate([0, 90, 0]) cylinder(h=50, r=bolt_hole_radius);
  }
}

module tolerance_test() {
  translate([0, 15, 0]) {
    bolt();
  }
  
  translate([-40, -6, 0]) {
    difference() {
  	  cube([80, 12, 4]);
	
    	for (i = [0:6]) {
      	translate([10*(i+1), 6, -1]) cylinder(h=7, r=2+(2*(i*0.05)));
    	}
  	}
	}
}

module tab_male() {
  translate([-2.5, 0, 0]) {
    cube([5, 7, 4]);
    translate([0.5,5,2]) sphere(r=1.2, center = true, $fn = 12);
    translate([4.5,5,2]) sphere(r=1.2, center = true, $fn = 12);
    translate([-2, 0, 0]) cube([9, 2, 4]);
  }
}

module slot_female() {
  cube([5, 6, 6]);
  translate([0,3.5,3]) sphere(r=1.2, center = true, $fn = 12);
  translate([5,3.5,3]) sphere(r=1.2, center = true, $fn = 12);
}

module solar_panel_lines() {
  union() {
    for (i = [0:10]) {
      translate([i*10, 0, 0]) cube([0.5, 100, 1]);
    }
    for (i = [0:10]) {
      translate([0, i*10, 0]) cube([100, 0.5, 1]);
    }
  }
}
